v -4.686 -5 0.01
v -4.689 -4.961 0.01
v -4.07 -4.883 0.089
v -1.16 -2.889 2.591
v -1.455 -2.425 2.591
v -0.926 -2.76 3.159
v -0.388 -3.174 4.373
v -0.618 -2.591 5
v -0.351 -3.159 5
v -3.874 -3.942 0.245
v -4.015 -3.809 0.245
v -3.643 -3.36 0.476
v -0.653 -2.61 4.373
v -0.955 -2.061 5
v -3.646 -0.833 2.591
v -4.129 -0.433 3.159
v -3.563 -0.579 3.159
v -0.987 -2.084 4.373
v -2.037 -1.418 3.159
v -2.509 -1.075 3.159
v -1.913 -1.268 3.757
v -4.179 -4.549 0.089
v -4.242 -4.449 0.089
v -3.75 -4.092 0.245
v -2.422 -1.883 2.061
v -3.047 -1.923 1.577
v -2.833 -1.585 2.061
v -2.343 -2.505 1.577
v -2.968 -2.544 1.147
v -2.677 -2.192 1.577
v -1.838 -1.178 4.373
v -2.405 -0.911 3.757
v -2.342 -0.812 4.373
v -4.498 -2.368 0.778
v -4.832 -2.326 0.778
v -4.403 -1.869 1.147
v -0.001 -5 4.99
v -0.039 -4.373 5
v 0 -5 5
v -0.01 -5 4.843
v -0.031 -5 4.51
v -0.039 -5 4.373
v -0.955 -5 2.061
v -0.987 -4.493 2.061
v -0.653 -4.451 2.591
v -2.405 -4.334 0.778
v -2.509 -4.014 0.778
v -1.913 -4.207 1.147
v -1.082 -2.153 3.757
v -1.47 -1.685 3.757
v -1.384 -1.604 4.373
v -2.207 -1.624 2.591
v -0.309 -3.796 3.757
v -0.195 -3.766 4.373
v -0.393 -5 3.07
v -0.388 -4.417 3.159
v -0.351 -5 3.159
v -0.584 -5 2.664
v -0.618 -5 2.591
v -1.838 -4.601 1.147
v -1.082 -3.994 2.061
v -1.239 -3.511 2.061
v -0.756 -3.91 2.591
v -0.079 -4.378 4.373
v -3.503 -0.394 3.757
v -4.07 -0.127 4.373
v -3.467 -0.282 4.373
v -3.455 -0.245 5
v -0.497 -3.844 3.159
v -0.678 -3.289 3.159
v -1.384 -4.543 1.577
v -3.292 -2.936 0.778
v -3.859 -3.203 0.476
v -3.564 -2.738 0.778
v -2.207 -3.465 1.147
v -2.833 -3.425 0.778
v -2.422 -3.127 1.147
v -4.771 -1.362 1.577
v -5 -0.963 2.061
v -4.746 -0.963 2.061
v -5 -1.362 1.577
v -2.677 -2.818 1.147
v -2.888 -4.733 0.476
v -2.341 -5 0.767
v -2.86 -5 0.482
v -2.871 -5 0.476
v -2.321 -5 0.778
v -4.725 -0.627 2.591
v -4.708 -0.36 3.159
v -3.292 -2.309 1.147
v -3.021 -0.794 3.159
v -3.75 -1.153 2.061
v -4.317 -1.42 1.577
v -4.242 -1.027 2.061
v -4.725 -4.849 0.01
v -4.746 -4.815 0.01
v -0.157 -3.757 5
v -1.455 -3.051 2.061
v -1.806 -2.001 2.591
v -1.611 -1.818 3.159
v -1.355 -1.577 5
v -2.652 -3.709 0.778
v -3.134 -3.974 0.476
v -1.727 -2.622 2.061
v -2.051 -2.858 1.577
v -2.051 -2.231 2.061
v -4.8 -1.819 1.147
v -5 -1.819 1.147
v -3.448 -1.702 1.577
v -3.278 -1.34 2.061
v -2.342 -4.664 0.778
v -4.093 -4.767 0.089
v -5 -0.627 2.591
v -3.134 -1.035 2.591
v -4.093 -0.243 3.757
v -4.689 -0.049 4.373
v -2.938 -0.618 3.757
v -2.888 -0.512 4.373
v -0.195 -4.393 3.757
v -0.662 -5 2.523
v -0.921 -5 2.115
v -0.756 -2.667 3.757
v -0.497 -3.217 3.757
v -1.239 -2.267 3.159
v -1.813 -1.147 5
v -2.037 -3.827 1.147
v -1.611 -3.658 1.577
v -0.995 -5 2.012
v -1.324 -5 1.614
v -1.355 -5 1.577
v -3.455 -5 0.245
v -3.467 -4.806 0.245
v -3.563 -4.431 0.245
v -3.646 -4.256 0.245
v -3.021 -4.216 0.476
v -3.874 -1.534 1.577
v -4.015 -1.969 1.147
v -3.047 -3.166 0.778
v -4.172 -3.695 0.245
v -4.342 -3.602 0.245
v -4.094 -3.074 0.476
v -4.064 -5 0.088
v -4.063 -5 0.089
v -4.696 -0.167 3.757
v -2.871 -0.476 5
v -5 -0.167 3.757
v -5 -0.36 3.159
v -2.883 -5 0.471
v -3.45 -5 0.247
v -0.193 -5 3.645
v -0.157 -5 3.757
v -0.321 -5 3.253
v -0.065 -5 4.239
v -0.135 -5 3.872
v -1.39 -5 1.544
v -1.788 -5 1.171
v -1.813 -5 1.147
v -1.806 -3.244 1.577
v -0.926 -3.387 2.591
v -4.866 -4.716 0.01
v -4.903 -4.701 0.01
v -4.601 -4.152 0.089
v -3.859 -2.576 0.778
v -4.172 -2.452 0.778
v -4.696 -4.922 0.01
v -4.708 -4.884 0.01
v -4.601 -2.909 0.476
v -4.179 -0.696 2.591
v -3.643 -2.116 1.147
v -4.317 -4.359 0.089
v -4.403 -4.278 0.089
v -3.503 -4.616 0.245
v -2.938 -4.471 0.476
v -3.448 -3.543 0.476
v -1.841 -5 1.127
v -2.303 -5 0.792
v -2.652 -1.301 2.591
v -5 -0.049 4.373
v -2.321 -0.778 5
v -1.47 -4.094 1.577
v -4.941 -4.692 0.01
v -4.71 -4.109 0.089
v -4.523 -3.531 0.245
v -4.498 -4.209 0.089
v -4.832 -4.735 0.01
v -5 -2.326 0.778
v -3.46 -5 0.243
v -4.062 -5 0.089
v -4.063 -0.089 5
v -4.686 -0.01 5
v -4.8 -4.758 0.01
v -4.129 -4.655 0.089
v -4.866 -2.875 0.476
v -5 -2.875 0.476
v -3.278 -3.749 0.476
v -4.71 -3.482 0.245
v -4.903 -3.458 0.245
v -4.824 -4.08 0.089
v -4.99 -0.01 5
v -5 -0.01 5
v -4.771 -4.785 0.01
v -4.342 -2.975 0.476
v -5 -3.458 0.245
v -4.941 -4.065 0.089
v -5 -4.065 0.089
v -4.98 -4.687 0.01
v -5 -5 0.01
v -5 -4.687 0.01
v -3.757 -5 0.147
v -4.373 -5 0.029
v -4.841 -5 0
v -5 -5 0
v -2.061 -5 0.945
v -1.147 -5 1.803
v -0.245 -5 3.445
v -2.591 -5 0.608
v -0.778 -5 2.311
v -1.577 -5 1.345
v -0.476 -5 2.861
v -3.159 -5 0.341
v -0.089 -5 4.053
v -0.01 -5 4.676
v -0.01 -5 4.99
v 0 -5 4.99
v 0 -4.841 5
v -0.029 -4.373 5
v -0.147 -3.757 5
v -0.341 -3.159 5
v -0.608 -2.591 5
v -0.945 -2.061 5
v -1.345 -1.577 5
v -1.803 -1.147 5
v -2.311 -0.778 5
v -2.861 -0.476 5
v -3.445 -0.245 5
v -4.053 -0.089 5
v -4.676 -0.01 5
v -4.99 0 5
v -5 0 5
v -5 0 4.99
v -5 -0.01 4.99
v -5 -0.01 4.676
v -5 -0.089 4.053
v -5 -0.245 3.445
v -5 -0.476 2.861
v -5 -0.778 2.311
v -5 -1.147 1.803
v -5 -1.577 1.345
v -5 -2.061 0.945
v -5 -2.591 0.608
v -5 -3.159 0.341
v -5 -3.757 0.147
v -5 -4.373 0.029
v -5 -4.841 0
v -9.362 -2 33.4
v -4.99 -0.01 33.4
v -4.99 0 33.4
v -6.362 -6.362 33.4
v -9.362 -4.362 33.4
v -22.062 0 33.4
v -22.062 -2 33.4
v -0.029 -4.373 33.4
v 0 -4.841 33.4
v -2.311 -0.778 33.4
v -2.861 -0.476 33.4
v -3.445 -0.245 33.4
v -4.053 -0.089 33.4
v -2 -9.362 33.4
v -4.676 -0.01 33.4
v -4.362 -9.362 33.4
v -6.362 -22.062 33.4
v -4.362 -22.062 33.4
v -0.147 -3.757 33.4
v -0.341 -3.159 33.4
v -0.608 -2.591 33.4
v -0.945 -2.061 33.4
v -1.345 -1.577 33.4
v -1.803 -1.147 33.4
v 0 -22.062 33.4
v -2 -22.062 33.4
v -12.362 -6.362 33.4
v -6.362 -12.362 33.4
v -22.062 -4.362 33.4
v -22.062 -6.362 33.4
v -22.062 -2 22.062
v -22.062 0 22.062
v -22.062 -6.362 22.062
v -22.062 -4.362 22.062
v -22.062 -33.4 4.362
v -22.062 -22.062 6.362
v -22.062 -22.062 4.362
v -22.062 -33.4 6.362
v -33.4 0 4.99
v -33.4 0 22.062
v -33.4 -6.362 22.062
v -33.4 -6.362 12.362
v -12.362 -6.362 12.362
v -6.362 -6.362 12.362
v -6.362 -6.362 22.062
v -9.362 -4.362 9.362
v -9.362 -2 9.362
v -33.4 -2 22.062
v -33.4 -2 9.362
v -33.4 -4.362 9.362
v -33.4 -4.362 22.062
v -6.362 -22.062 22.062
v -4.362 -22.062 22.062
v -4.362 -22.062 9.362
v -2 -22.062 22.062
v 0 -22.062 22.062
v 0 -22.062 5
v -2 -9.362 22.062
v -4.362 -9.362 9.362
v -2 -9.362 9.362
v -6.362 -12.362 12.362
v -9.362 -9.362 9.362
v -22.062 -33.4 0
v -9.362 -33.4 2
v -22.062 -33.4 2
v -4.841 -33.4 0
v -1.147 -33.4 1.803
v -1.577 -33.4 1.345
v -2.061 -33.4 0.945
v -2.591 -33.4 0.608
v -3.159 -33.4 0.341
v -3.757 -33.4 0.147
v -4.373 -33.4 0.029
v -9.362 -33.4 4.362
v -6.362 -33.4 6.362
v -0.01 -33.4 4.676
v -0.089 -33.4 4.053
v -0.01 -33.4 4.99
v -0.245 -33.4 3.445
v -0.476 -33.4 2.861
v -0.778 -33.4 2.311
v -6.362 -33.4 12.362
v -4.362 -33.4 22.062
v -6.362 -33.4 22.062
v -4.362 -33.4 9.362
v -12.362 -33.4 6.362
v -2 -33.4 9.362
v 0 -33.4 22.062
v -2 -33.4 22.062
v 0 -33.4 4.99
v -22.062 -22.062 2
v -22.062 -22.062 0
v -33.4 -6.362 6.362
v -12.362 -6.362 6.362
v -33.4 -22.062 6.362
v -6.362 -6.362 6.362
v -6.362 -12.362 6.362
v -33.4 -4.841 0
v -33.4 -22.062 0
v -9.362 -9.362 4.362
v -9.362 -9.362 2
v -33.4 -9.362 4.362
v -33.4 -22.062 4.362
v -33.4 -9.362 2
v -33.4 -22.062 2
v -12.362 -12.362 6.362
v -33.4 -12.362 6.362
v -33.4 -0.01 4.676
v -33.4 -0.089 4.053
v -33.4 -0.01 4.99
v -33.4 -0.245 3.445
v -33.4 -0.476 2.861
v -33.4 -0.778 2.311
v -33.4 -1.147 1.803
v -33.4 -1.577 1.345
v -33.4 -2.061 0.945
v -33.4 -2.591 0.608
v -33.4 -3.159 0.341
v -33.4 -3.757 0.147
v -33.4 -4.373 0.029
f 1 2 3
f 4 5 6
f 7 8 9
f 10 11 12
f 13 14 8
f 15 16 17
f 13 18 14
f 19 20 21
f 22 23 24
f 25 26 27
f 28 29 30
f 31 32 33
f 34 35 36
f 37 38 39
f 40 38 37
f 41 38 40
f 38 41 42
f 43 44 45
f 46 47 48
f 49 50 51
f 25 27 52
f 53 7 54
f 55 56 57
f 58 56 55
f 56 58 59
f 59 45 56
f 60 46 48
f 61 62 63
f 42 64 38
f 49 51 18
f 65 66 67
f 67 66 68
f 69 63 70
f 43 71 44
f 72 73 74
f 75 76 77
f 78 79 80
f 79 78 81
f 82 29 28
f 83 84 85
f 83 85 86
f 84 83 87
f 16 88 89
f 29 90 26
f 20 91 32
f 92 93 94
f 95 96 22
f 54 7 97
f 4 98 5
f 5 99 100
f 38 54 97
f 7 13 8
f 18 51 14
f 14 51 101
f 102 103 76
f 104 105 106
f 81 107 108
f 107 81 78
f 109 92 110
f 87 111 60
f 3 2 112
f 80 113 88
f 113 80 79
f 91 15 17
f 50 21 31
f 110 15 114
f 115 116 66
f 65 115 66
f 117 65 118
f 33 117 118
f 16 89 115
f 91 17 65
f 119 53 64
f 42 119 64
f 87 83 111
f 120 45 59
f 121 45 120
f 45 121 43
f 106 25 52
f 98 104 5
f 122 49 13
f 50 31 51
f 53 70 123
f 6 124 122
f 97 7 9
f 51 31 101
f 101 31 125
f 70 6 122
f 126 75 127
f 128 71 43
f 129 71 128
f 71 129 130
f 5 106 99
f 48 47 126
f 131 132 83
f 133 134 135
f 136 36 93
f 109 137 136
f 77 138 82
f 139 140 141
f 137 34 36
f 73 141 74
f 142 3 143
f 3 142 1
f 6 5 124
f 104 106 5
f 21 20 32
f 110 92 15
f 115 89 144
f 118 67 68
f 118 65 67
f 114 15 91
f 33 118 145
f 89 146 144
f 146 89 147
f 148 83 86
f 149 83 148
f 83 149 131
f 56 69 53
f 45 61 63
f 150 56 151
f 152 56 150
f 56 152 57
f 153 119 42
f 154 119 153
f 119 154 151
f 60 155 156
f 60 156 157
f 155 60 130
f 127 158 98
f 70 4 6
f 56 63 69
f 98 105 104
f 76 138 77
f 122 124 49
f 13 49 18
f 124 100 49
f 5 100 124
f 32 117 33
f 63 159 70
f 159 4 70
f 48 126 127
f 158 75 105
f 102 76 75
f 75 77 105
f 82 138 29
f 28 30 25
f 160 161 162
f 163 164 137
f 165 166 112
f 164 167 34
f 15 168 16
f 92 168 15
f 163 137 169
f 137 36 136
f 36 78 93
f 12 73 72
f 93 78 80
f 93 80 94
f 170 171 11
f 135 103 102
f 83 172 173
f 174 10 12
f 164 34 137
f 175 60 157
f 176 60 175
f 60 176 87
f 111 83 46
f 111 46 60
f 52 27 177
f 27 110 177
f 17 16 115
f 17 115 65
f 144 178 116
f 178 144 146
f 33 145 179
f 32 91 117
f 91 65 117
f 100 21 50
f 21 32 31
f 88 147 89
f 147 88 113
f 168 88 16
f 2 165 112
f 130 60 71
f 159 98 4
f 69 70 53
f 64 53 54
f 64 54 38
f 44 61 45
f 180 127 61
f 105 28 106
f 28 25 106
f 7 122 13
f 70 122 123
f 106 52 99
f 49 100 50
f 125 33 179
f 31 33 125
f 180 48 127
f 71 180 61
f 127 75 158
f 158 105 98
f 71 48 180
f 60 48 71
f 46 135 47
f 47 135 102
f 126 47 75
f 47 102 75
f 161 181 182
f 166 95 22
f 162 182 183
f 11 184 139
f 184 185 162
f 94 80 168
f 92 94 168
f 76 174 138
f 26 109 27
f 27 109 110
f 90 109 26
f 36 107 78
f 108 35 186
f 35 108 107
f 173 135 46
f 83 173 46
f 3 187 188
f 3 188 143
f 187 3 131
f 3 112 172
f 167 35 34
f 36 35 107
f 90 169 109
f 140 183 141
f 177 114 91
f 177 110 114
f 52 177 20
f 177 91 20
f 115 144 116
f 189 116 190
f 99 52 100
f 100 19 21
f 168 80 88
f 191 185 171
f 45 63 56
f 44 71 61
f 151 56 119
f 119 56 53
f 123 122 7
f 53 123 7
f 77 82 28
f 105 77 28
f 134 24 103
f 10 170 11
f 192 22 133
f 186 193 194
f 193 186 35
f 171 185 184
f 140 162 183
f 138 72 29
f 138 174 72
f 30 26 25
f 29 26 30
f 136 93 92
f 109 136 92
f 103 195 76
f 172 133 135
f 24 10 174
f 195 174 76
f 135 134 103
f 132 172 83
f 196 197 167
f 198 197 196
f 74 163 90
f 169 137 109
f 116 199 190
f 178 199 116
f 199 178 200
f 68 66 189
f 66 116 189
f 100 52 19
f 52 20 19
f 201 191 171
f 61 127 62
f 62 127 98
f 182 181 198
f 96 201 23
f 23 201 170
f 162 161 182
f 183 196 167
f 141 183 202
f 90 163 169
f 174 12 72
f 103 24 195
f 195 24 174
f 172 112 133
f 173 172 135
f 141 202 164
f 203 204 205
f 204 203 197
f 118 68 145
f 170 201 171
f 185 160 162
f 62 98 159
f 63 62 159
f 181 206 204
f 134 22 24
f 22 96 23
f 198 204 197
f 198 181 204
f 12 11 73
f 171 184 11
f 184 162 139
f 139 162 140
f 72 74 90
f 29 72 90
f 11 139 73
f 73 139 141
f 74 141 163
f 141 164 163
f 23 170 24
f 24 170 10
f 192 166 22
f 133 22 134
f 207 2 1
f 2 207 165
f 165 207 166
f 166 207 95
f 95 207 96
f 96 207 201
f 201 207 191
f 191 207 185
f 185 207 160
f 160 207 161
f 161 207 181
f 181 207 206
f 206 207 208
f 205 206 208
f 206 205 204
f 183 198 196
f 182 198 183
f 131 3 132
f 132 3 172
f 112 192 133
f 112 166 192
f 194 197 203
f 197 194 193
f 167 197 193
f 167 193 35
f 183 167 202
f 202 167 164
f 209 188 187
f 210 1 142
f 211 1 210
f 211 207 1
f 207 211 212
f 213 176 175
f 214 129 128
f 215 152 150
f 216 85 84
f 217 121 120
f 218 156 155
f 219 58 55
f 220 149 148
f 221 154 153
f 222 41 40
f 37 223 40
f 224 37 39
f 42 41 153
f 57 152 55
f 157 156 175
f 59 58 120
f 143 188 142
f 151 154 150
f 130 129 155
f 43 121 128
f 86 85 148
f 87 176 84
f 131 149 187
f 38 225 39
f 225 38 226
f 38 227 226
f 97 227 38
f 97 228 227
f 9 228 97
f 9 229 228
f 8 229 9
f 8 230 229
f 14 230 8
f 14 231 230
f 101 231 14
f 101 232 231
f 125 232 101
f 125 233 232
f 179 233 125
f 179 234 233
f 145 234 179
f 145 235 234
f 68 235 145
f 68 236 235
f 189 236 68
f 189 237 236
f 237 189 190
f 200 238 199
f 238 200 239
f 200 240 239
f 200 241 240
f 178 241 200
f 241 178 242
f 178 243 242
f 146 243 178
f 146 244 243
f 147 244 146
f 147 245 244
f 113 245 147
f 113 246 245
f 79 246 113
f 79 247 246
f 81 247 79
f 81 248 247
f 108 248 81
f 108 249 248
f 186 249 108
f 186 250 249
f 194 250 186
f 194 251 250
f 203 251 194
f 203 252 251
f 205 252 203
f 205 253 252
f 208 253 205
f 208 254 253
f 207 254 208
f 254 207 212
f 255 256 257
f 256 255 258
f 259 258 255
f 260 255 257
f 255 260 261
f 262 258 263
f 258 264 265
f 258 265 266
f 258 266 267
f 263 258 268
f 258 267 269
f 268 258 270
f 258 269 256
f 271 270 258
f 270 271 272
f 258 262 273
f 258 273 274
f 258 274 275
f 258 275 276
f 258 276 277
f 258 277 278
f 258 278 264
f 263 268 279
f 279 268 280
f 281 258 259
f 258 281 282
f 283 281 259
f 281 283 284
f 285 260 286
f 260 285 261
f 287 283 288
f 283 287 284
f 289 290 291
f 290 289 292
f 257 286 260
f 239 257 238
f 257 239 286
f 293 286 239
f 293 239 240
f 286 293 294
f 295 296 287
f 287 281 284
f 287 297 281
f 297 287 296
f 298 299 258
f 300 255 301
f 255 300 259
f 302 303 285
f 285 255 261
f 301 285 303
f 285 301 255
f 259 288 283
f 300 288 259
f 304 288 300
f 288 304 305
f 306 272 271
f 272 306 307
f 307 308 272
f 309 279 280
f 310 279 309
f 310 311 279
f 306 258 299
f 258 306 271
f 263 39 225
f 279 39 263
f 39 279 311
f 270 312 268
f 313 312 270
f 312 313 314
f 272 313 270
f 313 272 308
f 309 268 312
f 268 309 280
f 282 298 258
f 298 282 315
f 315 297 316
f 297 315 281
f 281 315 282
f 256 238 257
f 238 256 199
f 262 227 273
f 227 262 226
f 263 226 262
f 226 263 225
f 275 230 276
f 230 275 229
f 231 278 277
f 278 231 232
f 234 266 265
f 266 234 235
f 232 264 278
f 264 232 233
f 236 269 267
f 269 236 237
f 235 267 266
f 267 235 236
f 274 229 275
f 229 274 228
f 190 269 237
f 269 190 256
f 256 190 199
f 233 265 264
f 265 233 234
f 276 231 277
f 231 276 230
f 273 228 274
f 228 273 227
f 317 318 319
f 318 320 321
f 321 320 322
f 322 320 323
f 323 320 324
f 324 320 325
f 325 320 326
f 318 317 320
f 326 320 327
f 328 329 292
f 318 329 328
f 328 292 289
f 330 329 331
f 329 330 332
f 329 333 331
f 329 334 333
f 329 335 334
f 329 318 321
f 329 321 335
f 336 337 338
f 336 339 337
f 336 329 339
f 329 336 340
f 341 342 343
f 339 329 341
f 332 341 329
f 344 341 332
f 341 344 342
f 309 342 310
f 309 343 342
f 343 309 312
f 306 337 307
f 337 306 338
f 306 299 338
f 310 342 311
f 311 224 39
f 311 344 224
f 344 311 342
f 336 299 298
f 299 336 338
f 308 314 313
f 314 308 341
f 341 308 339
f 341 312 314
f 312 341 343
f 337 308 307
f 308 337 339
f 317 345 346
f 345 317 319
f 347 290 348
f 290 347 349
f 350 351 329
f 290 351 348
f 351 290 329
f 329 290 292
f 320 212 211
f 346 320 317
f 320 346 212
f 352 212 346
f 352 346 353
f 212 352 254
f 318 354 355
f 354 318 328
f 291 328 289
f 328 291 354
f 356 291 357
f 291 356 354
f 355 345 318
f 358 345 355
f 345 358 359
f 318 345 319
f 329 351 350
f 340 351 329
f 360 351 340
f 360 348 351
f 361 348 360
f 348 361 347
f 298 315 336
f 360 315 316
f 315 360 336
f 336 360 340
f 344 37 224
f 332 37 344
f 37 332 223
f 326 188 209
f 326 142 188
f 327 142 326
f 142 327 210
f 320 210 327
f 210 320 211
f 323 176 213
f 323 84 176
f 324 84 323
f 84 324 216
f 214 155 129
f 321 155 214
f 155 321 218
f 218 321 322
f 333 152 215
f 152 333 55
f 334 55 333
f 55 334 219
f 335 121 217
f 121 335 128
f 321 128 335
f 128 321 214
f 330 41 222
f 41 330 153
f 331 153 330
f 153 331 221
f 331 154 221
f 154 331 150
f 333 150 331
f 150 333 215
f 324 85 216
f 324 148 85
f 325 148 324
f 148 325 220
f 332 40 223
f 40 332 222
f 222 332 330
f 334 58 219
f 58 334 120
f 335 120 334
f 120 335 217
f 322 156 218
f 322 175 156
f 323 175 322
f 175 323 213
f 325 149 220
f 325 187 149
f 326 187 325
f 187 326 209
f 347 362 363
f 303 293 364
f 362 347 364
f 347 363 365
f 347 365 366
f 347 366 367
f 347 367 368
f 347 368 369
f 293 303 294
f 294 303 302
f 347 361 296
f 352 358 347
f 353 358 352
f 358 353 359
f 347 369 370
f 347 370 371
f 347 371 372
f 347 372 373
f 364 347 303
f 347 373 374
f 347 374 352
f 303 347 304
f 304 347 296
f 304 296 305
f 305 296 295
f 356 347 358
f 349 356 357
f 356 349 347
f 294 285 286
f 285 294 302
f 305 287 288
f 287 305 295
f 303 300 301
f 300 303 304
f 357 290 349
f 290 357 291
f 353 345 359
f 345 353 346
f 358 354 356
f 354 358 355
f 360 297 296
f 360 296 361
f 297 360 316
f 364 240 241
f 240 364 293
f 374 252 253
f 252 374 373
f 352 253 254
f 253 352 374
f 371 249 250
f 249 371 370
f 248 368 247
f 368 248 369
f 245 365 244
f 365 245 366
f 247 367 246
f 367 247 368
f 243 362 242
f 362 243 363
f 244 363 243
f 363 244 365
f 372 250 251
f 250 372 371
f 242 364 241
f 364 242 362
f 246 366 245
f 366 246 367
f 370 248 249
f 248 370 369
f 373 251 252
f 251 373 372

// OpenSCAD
//translate([54.7, -78, -280.02]) import("Corner.stl");
//translate([435.9305, -329.8393, 0]) import("100_Straight.stl");

// Type of piece
piece_type = "Corner"; // [Edge, Corner]
// Depth of the slot (original=9.8, 1/2"=12.7mm)
inner_depth = 12.7;
// Width of the slot (original=4, 0.093"=2.3622mm)
inner_width = 2.3622;
// Thickness of the walls around the slot (original=1.4, preferred=2)
wall_thickness = 2;
// Height (or length) of the piece (original Edge=100, default Corner=26.5)
height = 25.4;
// Radius of the chamfered edges (original=5)
corner_radius = 5;
// Adjust higher to make inner triangular supports wider (original=1, preferred=3)
triangle_multiplier = 3;
// Adjust higher to made the corner area (between the slots) wider (original=0, preferred=3)
additional_corner = 3;

total_thickness = inner_width + 2 * wall_thickness;
total_offset = total_thickness-corner_radius;

adj_corner_radius = corner_radius > total_thickness ? total_thickness : corner_radius;

//color([1,0,0])
translate([0-(inner_depth+total_thickness+additional_corner), 0-total_thickness, 0])
if (piece_type == "Edge") {
    chamfered_edge_piece(inner_depth, inner_width, height, wall_thickness, adj_corner_radius, triangle_multiplier, additional_corner, 0);
}
else {
    chamfered_corner_piece(inner_depth, inner_width, height, wall_thickness, adj_corner_radius, triangle_multiplier, additional_corner);
}

module chamfered_corner_piece(inner_depth, inner_width, height, wall_thickness, corner_radius, triangle_multiplier, additional_corner) {
    extra = corner_radius - total_thickness < 0 ? 0 : corner_radius - total_thickness;
    triangle_cutoff = 1;
    
    translate([total_thickness+inner_depth-corner_radius+additional_corner, total_thickness-corner_radius, corner_radius])
    difference() {
        sphere(r=corner_radius, $fn=50);
        translate([-corner_radius, -corner_radius*2, -corner_radius])
        cube(size = [corner_radius*2, corner_radius*2, corner_radius*2]);
        translate([-corner_radius, -corner_radius, 0])
        cube(size = [corner_radius*2, corner_radius*2, corner_radius*2]);
        translate([-corner_radius*2, -corner_radius, -corner_radius])
        cube(size = [corner_radius*2, corner_radius*2, corner_radius*2]);
        
        translate([-corner_radius+extra, -wall_thickness, -extra])
        cube(size = [corner_radius, corner_radius, corner_radius]);
        translate([-wall_thickness, -corner_radius+extra, -extra])
        cube(size = [corner_radius, corner_radius, corner_radius]);
        translate([-corner_radius+extra, -corner_radius+extra, -corner_radius+wall_thickness])
        cube(size = [corner_radius, corner_radius, corner_radius]);
    }
    
    union() {
        translate([0, 0, corner_radius])
        chamfered_edge_piece(inner_depth, inner_width, height+additional_corner, wall_thickness, corner_radius, triangle_multiplier, additional_corner, triangle_cutoff);
        
        rotate(a=90, v=[1,0,0])
        rotate(a=-90, v=[0,0,1])
        translate([-(inner_depth+total_thickness+additional_corner), inner_depth+additional_corner, -total_thickness+corner_radius])
        chamfered_edge_piece(inner_depth, inner_width, height+additional_corner, wall_thickness, corner_radius, triangle_multiplier, additional_corner, triangle_cutoff);
        
        mirror([1, 0, 0])
        rotate(a=90, v=[0,1,0])
        translate([-(inner_depth+total_thickness+additional_corner), 0, -(inner_depth+total_thickness)+corner_radius-additional_corner])
        chamfered_edge_piece(inner_depth, inner_width, height+additional_corner, wall_thickness, corner_radius, triangle_multiplier, additional_corner, triangle_cutoff);
        
    }
}

module chamfered_edge_piece(inner_depth, inner_width, height, wall_thickness, corner_radius, triangle_multiplier, additional_corner, triangle_cutoff) {
    total_thickness = inner_width + 2 * wall_thickness;
    difference()
    {
        edge_piece(inner_depth, inner_width, height, wall_thickness, triangle_multiplier, additional_corner, triangle_cutoff);
        chamfer_edge(inner_depth, inner_width, height, wall_thickness, corner_radius, additional_corner);
    }
}

module chamfer_edge(inner_depth, inner_width, height, wall_thickness, corner_radius, additional_corner) {
    //translate([0-corner_radius+0.01, 0-corner_radius, 0])
    total_thickness = inner_width + 2 * wall_thickness;
    translate([(inner_depth+total_thickness-corner_radius+additional_corner)+0.01, total_thickness - corner_radius, 0])
    difference() {
        difference() {
            cube([corner_radius, corner_radius, height]);
            cylinder(r=corner_radius,h=height, $fn=50);
            translate([-corner_radius*2, 0, 0]) cube([corner_radius*2, corner_radius*2, height+1]);
            translate([-corner_radius, -corner_radius*2, 0]) cube([corner_radius*2, corner_radius*2, height+1]);
        }
    }

}

module triangle(triangle_height, triangle_x, triangle_y) {
    linear_extrude(height = triangle_height)
    polygon(
        [[0,0],    // Triangle side
        [triangle_x,0],
        [triangle_x,triangle_y]],
        [[0,1,2]]
    );
}

module edge_piece(inner_depth, inner_width, height, wall_thickness, triangle_multiplier, additional_corner, triangle_cutoff) {
    total_thickness = inner_width + (2 * wall_thickness);
    triangle_edge = wall_thickness*triangle_multiplier;
    overall_depth = inner_depth + total_thickness + additional_corner;
    straight(inner_depth, inner_width, height, wall_thickness, additional_corner);
    rotate(a=90, v=[0,0,1])
    translate([0-inner_depth-additional_corner, 0-overall_depth, 0]) straight(inner_depth, inner_width, height, wall_thickness, additional_corner);
    rotate(a=90, v=[0,0,1])
    translate([-triangle_edge, -(inner_depth + additional_corner), triangle_cutoff])
    triangle(height-triangle_cutoff, triangle_edge, triangle_edge);
}

module straight(inner_depth, inner_width, height, wall_thickness, additional_corner) {
    total_thickness = inner_width + (2 * wall_thickness);
    overall_depth = inner_depth + total_thickness + additional_corner;
    difference () {
        cube([overall_depth, total_thickness, height]);
        translate([-1, wall_thickness, -1])
        cube([inner_depth+1, inner_width, height+2]);
    }
}
